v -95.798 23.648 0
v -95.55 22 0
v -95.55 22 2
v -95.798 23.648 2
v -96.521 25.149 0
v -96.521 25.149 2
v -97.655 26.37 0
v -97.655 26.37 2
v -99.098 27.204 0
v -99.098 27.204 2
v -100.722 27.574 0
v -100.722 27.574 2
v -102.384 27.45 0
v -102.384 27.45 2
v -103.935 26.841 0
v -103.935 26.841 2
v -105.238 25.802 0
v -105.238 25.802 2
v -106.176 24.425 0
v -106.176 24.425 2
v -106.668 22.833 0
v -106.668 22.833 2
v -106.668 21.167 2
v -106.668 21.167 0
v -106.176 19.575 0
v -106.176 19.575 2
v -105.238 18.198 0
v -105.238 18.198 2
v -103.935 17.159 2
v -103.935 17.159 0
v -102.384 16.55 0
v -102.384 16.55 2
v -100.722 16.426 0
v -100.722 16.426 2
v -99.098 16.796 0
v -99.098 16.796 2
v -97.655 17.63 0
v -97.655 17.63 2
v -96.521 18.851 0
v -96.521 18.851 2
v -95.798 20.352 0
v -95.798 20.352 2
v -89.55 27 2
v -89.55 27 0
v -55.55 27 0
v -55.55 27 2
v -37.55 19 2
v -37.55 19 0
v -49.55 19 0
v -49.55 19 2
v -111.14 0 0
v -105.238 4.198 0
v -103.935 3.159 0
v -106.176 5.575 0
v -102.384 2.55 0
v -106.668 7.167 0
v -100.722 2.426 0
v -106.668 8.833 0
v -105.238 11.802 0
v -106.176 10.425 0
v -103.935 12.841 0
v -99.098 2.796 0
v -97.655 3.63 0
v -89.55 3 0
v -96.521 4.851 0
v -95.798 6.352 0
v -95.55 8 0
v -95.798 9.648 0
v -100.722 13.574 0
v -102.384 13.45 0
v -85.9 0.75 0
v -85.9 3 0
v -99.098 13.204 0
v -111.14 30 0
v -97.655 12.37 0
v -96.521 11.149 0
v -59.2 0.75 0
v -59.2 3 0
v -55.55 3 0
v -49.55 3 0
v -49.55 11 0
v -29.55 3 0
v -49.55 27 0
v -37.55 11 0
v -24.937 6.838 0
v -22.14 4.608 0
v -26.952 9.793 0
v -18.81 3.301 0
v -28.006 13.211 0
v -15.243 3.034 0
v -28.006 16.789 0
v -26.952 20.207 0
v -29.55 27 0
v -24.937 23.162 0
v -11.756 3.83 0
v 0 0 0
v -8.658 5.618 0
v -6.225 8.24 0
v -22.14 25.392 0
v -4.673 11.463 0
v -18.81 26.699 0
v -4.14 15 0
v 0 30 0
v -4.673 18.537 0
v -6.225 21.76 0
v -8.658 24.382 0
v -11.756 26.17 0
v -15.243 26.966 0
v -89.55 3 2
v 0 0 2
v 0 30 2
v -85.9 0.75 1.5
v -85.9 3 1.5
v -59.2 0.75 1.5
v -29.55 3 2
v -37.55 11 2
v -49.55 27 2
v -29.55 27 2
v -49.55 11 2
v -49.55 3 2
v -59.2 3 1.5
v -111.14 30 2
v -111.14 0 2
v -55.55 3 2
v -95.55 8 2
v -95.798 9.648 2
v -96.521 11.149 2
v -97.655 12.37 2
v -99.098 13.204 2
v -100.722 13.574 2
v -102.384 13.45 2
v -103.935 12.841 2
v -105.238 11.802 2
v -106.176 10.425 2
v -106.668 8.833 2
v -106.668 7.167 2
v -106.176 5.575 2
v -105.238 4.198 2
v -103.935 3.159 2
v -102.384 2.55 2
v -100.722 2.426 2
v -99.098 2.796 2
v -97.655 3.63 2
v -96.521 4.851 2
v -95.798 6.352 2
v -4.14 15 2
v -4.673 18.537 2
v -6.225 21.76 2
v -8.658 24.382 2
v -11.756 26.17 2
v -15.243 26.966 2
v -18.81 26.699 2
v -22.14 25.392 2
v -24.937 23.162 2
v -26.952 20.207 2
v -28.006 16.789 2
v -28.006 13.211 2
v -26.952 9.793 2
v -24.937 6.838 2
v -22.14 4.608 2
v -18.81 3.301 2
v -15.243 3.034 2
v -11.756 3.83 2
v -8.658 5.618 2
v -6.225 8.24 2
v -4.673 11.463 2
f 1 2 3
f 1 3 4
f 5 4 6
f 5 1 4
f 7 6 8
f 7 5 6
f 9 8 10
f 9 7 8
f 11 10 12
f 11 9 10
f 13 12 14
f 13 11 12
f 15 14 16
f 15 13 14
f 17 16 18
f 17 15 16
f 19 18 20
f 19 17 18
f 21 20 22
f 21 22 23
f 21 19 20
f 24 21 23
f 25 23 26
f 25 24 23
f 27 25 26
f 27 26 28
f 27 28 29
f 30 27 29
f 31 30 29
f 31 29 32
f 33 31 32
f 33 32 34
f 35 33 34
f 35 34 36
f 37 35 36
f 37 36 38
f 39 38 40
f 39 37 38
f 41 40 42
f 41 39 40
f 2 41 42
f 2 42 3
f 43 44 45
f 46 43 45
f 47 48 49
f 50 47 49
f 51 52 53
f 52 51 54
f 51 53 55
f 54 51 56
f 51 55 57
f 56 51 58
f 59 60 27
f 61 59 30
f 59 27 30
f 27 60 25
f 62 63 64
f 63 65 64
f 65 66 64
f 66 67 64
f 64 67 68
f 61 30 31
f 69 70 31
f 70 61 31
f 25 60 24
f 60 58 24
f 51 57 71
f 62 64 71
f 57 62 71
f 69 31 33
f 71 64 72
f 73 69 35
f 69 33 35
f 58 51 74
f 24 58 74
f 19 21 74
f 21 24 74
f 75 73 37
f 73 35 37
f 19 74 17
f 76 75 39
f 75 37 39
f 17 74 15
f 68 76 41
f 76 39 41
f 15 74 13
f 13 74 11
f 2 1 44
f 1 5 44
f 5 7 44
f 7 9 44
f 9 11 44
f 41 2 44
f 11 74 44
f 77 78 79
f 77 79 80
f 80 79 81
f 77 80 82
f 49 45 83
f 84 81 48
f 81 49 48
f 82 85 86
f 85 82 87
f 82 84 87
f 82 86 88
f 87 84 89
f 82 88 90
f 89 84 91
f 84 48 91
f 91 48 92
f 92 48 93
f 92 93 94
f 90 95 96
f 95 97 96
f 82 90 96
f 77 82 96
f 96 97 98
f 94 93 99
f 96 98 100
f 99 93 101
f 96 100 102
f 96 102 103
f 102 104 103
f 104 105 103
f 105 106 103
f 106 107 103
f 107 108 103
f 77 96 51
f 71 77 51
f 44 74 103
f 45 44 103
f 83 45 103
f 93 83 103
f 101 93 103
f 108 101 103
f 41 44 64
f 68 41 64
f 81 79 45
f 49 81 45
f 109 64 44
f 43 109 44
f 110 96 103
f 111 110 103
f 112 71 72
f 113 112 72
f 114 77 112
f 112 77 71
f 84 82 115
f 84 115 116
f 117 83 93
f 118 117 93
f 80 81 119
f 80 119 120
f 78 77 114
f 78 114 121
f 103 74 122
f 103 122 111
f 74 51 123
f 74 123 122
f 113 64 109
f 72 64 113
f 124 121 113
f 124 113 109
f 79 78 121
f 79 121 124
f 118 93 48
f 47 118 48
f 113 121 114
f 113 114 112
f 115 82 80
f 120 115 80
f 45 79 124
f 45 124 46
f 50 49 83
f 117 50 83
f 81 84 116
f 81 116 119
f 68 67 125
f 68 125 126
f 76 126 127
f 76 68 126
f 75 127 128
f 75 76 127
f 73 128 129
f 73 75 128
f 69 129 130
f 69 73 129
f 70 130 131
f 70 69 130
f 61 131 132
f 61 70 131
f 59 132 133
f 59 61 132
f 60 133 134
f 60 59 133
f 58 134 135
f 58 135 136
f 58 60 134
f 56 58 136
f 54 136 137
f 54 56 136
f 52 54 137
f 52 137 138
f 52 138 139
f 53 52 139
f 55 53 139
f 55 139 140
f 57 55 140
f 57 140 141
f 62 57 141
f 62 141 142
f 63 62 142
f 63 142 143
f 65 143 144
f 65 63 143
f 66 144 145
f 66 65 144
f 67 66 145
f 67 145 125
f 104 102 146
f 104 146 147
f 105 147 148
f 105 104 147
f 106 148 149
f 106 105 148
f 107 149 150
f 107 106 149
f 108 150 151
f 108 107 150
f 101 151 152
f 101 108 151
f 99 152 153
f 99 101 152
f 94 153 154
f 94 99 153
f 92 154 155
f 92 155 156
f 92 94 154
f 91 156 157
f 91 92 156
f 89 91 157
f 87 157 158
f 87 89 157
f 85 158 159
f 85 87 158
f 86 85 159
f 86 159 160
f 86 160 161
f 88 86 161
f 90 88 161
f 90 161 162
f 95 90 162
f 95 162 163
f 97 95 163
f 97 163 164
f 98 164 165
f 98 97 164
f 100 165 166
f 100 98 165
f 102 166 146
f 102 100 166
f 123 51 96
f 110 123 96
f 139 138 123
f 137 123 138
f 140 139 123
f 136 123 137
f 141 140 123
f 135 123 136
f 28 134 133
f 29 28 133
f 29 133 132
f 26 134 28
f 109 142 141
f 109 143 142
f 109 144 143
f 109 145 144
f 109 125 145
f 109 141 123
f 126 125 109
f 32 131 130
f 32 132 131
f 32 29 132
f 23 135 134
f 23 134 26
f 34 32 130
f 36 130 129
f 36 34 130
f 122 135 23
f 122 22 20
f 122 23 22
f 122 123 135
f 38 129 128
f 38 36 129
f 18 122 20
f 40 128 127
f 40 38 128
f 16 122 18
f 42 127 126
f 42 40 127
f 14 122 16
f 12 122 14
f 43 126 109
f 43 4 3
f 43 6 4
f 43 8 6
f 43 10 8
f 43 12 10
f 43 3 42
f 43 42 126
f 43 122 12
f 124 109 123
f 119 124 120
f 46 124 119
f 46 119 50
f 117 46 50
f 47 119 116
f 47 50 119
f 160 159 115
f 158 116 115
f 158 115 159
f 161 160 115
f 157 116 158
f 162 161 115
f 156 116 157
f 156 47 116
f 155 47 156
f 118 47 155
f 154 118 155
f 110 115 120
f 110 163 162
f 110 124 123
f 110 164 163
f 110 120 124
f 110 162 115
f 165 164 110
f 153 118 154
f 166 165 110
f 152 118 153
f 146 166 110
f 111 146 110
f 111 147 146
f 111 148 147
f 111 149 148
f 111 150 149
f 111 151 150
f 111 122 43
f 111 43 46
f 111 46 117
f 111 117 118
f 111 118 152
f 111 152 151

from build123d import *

# Parameters (mm, degrees)
SKETCH2_W           = 111.14
SKETCH2_H           = 30
SKETCH2_R           = 5.59
SKETCH2_R_2         = 12
SKETCH2_W_2         = 34
SKETCH2_H_2         = 24
BOSS_EXTRUDE1_DEPTH = 2
SKETCH3_W           = 26.7
SKETCH3_H           = 2.25
CUT_EXTRUDE1_DEPTH  = 1.5


with BuildPart() as part:
    # Sketch2 → Boss-Extrude1 (new body)
    with BuildSketch(Plane.XY):
        with Locations((-55.57, 15)):
            Rectangle(SKETCH2_W, SKETCH2_H)
        with Locations((-101.14, 22)):
            Circle(SKETCH2_R, mode=Mode.SUBTRACT)
        with Locations((-101.14, 8)):
            Circle(SKETCH2_R, mode=Mode.SUBTRACT)
        with Locations((-16.14, 15)):
            Circle(SKETCH2_R_2, mode=Mode.SUBTRACT)
        Polygon((-36.596, 27), (-29.55, 27), (-37.55, 19), (-49.55, 19), (-49.55, 27), align=None, mode=Mode.SUBTRACT)
        Polygon((-49.55, 3), (-37.006, 3), (-29.55, 3), (-37.55, 11), (-49.55, 11), align=None, mode=Mode.SUBTRACT)
        with Locations((-72.55, 15)):
            Rectangle(SKETCH2_W_2, SKETCH2_H_2, mode=Mode.SUBTRACT)
    extrude(amount=BOSS_EXTRUDE1_DEPTH)

    # Sketch3 → Cut-Extrude1 (cut)
    with BuildSketch(Plane(origin=(0, 0, 0), x_dir=(-1, 0, 0), z_dir=(0, 0, -1))):
        with Locations((72.55, 1.875)):
            Rectangle(SKETCH3_W, SKETCH3_H)
    extrude(amount=-CUT_EXTRUDE1_DEPTH, mode=Mode.SUBTRACT)


solid = part.part
